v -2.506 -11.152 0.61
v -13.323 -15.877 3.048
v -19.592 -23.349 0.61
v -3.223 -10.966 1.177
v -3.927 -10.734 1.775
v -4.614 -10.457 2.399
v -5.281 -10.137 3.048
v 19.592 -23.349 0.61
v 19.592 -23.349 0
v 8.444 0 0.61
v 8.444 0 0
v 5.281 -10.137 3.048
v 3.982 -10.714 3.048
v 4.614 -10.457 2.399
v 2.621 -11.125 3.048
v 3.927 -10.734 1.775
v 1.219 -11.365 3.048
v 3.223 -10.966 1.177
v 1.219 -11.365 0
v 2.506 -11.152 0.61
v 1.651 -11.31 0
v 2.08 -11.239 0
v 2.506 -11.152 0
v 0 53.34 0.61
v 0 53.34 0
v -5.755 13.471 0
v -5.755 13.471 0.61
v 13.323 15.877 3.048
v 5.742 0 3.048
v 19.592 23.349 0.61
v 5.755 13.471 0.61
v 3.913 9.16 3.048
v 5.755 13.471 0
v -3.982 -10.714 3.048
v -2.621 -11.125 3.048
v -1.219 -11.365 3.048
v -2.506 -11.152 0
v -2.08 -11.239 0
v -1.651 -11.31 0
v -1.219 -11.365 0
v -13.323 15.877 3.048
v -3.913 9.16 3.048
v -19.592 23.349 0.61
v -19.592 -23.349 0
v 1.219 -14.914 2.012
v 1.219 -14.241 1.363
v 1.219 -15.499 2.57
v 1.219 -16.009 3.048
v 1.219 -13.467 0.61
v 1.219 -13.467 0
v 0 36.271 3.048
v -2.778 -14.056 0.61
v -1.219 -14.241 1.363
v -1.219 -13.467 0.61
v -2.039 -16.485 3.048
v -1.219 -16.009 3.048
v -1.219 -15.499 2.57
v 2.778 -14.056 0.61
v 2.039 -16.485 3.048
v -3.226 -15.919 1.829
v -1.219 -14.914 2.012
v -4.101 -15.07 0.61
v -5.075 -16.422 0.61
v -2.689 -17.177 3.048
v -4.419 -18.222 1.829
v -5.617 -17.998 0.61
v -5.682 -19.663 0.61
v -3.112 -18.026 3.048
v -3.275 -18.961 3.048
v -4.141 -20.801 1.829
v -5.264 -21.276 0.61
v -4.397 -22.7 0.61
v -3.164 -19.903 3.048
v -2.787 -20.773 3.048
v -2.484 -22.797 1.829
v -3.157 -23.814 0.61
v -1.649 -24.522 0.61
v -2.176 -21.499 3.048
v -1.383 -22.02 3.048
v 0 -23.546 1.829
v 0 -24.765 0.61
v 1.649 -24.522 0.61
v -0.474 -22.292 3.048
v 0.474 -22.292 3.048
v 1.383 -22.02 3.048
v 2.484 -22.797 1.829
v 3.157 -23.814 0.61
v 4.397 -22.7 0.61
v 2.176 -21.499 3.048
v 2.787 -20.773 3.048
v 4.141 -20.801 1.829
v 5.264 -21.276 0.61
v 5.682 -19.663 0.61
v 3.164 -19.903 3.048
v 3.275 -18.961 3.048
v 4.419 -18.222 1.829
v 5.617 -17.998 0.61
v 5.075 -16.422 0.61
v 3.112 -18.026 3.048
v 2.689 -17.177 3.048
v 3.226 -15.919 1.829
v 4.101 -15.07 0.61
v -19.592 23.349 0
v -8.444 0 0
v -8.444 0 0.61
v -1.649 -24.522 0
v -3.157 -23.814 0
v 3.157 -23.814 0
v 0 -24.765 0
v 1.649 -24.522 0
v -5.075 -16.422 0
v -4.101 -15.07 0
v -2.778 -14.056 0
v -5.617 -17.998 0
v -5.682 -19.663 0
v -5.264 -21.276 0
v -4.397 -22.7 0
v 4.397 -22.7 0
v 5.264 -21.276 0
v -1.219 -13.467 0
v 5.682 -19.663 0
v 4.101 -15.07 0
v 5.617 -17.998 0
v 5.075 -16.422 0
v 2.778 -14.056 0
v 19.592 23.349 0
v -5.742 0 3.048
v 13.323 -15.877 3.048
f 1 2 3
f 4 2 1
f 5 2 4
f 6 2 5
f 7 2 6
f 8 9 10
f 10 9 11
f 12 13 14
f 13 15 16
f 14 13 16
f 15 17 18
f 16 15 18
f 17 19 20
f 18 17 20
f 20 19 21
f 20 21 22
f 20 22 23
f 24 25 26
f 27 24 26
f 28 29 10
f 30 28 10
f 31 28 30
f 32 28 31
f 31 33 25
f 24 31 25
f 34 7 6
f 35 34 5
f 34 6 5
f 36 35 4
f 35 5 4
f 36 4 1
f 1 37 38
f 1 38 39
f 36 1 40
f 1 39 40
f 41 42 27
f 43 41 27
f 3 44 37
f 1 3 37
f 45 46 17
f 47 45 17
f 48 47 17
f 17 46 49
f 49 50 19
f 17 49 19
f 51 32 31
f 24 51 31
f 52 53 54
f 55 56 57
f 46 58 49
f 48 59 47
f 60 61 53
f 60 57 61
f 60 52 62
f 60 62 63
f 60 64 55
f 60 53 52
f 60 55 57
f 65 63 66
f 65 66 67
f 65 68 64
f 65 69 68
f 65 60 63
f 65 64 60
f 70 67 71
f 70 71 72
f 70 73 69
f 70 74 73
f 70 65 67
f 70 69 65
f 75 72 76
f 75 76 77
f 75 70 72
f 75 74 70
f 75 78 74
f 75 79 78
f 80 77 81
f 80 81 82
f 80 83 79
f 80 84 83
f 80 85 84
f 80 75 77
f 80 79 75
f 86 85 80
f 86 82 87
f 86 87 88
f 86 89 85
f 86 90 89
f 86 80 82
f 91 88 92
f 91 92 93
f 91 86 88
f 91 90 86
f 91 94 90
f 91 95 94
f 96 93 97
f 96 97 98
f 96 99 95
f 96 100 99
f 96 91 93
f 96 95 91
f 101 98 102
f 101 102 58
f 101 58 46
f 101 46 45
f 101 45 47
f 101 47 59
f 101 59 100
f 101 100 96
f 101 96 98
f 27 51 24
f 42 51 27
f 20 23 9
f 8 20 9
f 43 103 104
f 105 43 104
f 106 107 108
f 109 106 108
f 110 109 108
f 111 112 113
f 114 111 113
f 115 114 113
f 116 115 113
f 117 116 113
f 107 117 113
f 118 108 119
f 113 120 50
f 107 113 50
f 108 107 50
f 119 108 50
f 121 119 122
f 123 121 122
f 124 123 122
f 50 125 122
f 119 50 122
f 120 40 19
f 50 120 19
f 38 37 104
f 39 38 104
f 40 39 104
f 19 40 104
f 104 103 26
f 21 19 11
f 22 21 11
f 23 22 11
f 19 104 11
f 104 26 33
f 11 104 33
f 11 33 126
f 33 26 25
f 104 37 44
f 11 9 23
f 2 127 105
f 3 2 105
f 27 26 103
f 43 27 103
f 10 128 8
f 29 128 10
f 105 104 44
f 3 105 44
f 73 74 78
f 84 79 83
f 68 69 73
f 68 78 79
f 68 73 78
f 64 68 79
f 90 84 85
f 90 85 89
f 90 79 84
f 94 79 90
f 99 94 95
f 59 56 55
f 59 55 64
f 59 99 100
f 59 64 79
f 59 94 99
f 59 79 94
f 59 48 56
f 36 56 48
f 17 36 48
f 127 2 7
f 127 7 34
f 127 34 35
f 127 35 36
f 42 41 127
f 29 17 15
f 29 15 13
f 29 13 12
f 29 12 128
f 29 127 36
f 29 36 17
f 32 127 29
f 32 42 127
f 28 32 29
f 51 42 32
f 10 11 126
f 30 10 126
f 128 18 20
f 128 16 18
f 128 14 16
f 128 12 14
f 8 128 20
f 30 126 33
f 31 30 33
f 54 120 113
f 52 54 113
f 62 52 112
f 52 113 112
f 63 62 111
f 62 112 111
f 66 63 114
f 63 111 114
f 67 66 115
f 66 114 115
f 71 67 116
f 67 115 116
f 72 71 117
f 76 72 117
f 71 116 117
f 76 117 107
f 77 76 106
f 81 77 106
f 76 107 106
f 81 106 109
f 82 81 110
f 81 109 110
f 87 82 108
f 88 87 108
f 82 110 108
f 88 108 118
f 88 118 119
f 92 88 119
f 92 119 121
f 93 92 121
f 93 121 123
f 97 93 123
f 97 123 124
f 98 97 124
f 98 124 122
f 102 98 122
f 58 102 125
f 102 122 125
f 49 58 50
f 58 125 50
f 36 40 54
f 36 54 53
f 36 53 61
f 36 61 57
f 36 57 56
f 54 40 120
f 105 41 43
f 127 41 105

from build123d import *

# Parameters (mm, degrees)
F1_DEPTH = 2.54
F2_SIZE  = 2.032
F3_SCALE = 1.2


with BuildPart() as f1:
    # F0 (on Top) → F1 (new body)
    with BuildSketch(Plane.XY):
        with BuildLine():
            Line((4.7955396725, 11.2255265503), (0, 44.45))
            Line((0, 44.45), (-4.7955396725, 11.2255265503))
            Line((-4.7955396725, 11.2255265503), (-16.326805286, 19.4575288552))
            Line((-16.326805286, 19.4575288552), (-7.0366641055, 0))
            Line((-7.0366641055, 0), (-16.326805286, -19.4575288552))
            Line((-16.326805286, -19.4575288552), (-2.0887149606, -9.2931638753))
            ThreePointArc((-2.0887149606, -9.2931638753), (-1.5548922201, -9.3972301868), (-1.016, -9.4706583193))
            Line((-1.016, -9.4706583193), (-1.016, -11.2221352642))
            ThreePointArc((-1.016, -11.2221352642), (0, -20.6375), (1.016, -11.2221352642))
            Line((1.016, -11.2221352642), (1.016, -9.4706583193))
            ThreePointArc((1.016, -9.4706583193), (1.5548922201, -9.3972301868), (2.0887149606, -9.2931638753))
            Line((2.0887149606, -9.2931638753), (16.326805286, -19.4575288552))
            Line((16.326805286, -19.4575288552), (7.0366641055, 0))
            Line((7.0366641055, 0), (16.326805286, 19.4575288552))
            Line((16.326805286, 19.4575288552), (4.7955396725, 11.2255265503))
        make_face()
    extrude(amount=F1_DEPTH)

    # F2
    f2_edges = [f1.edges().sort_by_distance(p)[0] for p in [
        (-2.39777, 27.837763, 2.54),
        (10.561172, 15.341528, 2.54),
        (11.681735, 9.728764, 2.54),
        (-10.561172, 15.341528, 2.54),
        (-11.681735, 9.728764, 2.54),
        (2.39777, 27.837763, 2.54),
        (11.681735, -9.728764, 2.54),
        (9.20776, -14.375346, 2.54),
        (-9.20776, -14.375346, 2.54),
        (-11.681735, -9.728764, 2.54),
        (0, -20.6375, 2.54),
    ]]
    chamfer(f2_edges, length=F2_SIZE)


with BuildPart() as f1_1:
    # F3: moved
    add(f1.part.scale(F3_SCALE))


solid = f1_1.part
